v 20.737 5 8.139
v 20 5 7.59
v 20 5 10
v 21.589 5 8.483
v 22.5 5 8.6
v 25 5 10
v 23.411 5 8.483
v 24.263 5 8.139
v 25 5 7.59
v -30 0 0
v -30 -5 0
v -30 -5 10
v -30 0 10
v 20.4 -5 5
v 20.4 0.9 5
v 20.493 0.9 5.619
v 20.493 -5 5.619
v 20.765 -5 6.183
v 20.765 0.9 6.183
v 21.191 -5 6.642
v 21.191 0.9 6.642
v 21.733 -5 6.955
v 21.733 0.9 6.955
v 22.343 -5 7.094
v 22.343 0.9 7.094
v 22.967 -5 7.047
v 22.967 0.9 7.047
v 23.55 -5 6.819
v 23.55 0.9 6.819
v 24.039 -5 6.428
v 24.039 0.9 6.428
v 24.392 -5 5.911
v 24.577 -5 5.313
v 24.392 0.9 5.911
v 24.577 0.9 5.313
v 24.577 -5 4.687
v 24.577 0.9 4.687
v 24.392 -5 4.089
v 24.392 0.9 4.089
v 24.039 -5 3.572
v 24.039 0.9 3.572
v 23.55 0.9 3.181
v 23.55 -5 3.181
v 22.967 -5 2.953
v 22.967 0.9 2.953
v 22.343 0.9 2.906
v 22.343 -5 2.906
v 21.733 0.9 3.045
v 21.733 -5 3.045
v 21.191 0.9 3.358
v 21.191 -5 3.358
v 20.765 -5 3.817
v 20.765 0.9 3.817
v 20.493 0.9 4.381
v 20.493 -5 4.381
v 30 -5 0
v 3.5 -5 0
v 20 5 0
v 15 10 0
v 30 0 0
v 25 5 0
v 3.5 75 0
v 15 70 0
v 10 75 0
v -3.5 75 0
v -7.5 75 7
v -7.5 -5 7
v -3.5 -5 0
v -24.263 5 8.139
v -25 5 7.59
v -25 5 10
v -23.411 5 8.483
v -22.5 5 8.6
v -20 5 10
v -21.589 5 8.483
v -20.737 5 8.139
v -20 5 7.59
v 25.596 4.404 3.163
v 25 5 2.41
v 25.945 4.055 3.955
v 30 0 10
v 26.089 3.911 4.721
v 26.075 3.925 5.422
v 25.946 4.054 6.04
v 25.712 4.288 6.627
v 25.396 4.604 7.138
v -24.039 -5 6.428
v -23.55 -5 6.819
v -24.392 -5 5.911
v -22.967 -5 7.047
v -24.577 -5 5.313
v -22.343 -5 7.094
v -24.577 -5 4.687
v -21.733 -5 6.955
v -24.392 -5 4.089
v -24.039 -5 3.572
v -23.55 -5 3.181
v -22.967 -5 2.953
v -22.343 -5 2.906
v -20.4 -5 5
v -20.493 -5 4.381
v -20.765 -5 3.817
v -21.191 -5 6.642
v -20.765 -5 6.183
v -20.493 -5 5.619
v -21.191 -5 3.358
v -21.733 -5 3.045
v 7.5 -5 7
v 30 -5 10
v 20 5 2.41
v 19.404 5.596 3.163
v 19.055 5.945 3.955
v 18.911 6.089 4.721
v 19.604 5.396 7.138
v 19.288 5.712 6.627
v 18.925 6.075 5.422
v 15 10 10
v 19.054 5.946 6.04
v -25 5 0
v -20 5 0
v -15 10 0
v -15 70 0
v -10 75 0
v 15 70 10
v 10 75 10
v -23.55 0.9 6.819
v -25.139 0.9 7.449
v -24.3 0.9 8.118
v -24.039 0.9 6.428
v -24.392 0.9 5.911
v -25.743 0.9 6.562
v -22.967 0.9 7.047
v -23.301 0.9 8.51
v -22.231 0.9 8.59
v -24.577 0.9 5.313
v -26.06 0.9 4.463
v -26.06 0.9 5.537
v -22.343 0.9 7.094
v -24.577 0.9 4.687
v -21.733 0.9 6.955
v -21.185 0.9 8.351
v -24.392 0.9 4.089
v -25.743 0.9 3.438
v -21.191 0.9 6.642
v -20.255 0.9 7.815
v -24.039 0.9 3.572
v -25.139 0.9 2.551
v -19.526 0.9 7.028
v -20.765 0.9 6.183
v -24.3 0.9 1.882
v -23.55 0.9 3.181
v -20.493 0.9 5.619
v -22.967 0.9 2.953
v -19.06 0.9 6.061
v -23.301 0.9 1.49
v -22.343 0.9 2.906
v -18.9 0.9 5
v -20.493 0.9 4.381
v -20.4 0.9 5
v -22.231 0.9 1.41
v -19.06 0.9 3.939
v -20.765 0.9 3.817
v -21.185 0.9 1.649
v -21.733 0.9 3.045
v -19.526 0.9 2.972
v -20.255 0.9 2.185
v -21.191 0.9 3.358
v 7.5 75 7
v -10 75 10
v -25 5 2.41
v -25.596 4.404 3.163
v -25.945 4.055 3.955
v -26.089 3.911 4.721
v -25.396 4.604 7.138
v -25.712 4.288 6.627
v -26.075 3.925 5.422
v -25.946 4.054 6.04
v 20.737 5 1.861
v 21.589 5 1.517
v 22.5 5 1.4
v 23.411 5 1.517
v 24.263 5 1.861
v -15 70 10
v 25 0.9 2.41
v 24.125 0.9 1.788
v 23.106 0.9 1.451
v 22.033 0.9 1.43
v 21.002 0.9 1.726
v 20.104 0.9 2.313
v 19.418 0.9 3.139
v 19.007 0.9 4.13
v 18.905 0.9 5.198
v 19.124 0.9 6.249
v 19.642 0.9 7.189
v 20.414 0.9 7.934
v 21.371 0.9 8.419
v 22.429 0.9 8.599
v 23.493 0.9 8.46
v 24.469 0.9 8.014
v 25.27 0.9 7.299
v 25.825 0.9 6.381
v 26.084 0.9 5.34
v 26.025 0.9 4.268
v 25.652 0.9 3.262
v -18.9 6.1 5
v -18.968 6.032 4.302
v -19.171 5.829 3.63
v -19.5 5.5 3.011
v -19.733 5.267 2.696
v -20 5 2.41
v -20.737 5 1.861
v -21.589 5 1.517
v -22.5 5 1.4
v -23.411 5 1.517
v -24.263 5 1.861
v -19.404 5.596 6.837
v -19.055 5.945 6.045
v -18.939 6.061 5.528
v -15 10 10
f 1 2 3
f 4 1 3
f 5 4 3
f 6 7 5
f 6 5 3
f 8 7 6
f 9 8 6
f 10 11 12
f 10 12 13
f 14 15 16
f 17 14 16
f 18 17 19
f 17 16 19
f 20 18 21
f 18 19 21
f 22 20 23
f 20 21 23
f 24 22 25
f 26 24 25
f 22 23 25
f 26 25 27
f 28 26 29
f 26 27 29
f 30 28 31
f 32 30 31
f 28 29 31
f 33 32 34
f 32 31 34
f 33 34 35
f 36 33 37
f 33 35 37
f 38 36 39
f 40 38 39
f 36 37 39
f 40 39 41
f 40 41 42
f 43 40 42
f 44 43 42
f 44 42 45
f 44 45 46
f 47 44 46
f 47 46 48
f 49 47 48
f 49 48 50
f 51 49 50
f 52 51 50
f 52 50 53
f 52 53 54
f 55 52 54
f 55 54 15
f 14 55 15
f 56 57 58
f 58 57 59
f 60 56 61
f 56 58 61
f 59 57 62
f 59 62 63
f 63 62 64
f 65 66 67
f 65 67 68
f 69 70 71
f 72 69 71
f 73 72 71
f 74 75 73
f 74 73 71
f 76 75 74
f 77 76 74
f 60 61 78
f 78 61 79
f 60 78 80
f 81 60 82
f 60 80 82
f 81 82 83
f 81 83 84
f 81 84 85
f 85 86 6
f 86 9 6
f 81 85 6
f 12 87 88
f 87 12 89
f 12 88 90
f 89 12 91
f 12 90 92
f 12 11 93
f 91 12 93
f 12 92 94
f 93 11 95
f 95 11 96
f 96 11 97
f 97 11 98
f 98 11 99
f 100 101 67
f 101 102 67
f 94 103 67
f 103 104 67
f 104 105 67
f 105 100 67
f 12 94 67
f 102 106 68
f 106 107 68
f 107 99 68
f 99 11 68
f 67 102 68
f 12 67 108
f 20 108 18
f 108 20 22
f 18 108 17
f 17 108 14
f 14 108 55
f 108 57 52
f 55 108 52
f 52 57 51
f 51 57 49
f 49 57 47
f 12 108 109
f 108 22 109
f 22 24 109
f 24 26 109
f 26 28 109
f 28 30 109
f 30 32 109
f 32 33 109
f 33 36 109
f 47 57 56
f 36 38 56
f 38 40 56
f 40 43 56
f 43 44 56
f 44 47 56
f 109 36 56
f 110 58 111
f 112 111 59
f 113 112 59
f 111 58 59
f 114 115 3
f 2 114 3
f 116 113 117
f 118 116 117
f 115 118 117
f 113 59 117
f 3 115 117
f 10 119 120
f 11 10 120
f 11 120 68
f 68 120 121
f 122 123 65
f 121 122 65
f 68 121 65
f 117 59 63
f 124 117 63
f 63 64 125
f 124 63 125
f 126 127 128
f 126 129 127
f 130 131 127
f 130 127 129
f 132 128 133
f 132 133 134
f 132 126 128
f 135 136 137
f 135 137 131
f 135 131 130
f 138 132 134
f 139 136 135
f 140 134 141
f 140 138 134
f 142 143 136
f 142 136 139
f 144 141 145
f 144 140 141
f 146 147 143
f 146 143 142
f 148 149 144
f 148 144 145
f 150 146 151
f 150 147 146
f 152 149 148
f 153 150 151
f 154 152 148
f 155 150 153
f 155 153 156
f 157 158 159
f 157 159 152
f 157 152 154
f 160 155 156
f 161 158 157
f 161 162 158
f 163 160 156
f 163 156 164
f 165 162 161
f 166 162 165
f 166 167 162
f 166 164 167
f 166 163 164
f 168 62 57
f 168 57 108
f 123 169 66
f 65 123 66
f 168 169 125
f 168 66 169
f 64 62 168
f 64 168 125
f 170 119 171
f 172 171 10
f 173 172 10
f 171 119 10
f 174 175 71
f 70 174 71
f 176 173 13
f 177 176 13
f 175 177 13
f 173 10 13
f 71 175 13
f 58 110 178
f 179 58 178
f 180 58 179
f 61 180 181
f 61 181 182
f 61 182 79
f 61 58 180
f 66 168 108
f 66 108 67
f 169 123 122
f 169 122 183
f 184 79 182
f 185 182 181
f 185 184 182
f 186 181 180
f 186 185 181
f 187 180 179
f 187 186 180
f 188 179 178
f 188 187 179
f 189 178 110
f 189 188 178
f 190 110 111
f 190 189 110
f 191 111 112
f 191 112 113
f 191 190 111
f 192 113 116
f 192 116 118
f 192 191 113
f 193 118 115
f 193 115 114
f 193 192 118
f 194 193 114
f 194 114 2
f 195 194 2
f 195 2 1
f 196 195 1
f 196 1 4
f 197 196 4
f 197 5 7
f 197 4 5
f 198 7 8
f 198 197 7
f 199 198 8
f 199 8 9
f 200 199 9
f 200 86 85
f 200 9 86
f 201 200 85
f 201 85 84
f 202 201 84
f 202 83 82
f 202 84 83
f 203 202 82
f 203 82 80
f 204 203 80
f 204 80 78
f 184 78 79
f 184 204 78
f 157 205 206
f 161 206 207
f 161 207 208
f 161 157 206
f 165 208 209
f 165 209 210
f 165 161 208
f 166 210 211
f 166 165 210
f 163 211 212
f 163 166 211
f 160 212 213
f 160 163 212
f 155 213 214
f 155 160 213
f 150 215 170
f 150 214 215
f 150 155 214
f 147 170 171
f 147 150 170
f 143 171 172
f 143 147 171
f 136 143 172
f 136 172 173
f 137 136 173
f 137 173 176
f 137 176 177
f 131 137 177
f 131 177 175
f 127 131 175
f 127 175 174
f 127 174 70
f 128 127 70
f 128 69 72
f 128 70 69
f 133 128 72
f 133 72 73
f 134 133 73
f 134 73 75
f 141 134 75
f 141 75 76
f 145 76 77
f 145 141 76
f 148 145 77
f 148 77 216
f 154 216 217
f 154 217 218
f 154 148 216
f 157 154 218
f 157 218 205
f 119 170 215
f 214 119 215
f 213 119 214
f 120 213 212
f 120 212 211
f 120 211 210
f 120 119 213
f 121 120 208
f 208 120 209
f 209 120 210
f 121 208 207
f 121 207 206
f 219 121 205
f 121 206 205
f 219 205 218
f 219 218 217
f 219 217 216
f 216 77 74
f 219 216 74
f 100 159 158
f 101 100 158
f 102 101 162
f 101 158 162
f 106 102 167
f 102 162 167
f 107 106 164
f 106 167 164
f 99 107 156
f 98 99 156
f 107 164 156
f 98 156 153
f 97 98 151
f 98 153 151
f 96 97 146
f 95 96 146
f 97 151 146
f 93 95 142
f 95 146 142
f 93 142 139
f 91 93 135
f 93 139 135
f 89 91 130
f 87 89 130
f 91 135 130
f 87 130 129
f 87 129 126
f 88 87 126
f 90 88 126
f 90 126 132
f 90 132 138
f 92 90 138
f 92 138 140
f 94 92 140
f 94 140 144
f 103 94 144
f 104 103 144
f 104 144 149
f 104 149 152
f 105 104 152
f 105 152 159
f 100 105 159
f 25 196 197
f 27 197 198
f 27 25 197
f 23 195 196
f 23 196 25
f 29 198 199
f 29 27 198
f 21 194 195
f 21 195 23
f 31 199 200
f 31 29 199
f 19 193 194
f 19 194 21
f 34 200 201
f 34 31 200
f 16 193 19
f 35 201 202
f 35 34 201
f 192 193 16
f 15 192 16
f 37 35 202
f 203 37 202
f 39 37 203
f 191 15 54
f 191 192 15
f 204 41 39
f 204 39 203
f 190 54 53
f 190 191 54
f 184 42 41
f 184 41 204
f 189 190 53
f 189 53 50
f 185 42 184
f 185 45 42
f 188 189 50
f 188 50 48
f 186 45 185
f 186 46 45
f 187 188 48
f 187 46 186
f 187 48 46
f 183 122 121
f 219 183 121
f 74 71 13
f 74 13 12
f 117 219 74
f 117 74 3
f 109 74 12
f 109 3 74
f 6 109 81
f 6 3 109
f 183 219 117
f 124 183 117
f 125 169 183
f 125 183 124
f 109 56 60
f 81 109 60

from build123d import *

# Parameters (mm, degrees)
SKETCH1_W               = 30
SKETCH1_H               = 70
SKETCH1_W_2             = 15
SKETCH1_H_2             = 10
BOSS_EXTRUDE1_DEPTH     = 10
CHAMFER1_SIZE           = 5
CUT_EXTRUDE1_DEPTH      = 213
SKETCH3_R               = 2.1
CUT_EXTRUDE2_DEPTH      = 213
CUT_EXTRUDE3_DEPTH      = 213
CUT_EXTRUDE3_DEPTH_BACK = 4.1
SKETCH4_R               = 3.6


with BuildPart() as part:
    # Sketch1 → Boss-Extrude1 (new body)
    with BuildSketch(Plane.XY):
        with Locations((0, 40)):
            Rectangle(SKETCH1_W, SKETCH1_H)
        with Locations((22.5, 0)):
            Rectangle(SKETCH1_W_2, SKETCH1_H_2)
        Rectangle(SKETCH1_W, SKETCH1_H_2)
        with Locations((-22.5, 0)):
            Rectangle(SKETCH1_W_2, SKETCH1_H_2)
    extrude(amount=BOSS_EXTRUDE1_DEPTH)

    # Chamfer1
    chamfer1_edges = [part.edges().sort_by_distance(p)[0] for p in [
        (-15, 75, 5),
        (15, 75, 5),
        (15, 5, 5),
        (30, 5, 5),
        (-30, 5, 5),
        (-15, 5, 5),
    ]]
    chamfer(chamfer1_edges, length=CHAMFER1_SIZE)

    # Sketch2 → Cut-Extrude1 (cut)
    with BuildSketch(Plane(origin=(0, 75, 0), x_dir=(1, 0, 0), z_dir=(0, 1, 0))):
        Polygon((7.500239939, -7), (-7.500239939, -7), (-3.5, 0), (3.5, 0), align=None)
    extrude(amount=-CUT_EXTRUDE1_DEPTH, mode=Mode.SUBTRACT)

    # Sketch3 → Cut-Extrude2 (cut)
    with BuildSketch(Plane(origin=(0, 5, 0), x_dir=(1, 0, 0), z_dir=(0, 1, 0))):
        with Locations(Location((22.5, -5, 0), (0, 0, 180))):
            Circle(SKETCH3_R)
        with Locations((-22.5, -5)):
            Circle(SKETCH3_R)
    extrude(amount=-CUT_EXTRUDE2_DEPTH, mode=Mode.SUBTRACT)

    # Sketch4 → Cut-Extrude3 (cut, two sides: drawn at the far end of the back side and taken through both)
    with BuildSketch(Plane(origin=(0, 5, 0), x_dir=(1, 0, 0), z_dir=(0, 1, 0)).offset(-CUT_EXTRUDE3_DEPTH_BACK)):
        with Locations(Location((22.5, -5, 0), (0, 0, 46.01703687))):
            Circle(SKETCH4_R)
        with Locations((-22.5, -5)):
            Circle(SKETCH4_R)
    extrude(amount=CUT_EXTRUDE3_DEPTH + CUT_EXTRUDE3_DEPTH_BACK, mode=Mode.SUBTRACT)


solid = part.part
